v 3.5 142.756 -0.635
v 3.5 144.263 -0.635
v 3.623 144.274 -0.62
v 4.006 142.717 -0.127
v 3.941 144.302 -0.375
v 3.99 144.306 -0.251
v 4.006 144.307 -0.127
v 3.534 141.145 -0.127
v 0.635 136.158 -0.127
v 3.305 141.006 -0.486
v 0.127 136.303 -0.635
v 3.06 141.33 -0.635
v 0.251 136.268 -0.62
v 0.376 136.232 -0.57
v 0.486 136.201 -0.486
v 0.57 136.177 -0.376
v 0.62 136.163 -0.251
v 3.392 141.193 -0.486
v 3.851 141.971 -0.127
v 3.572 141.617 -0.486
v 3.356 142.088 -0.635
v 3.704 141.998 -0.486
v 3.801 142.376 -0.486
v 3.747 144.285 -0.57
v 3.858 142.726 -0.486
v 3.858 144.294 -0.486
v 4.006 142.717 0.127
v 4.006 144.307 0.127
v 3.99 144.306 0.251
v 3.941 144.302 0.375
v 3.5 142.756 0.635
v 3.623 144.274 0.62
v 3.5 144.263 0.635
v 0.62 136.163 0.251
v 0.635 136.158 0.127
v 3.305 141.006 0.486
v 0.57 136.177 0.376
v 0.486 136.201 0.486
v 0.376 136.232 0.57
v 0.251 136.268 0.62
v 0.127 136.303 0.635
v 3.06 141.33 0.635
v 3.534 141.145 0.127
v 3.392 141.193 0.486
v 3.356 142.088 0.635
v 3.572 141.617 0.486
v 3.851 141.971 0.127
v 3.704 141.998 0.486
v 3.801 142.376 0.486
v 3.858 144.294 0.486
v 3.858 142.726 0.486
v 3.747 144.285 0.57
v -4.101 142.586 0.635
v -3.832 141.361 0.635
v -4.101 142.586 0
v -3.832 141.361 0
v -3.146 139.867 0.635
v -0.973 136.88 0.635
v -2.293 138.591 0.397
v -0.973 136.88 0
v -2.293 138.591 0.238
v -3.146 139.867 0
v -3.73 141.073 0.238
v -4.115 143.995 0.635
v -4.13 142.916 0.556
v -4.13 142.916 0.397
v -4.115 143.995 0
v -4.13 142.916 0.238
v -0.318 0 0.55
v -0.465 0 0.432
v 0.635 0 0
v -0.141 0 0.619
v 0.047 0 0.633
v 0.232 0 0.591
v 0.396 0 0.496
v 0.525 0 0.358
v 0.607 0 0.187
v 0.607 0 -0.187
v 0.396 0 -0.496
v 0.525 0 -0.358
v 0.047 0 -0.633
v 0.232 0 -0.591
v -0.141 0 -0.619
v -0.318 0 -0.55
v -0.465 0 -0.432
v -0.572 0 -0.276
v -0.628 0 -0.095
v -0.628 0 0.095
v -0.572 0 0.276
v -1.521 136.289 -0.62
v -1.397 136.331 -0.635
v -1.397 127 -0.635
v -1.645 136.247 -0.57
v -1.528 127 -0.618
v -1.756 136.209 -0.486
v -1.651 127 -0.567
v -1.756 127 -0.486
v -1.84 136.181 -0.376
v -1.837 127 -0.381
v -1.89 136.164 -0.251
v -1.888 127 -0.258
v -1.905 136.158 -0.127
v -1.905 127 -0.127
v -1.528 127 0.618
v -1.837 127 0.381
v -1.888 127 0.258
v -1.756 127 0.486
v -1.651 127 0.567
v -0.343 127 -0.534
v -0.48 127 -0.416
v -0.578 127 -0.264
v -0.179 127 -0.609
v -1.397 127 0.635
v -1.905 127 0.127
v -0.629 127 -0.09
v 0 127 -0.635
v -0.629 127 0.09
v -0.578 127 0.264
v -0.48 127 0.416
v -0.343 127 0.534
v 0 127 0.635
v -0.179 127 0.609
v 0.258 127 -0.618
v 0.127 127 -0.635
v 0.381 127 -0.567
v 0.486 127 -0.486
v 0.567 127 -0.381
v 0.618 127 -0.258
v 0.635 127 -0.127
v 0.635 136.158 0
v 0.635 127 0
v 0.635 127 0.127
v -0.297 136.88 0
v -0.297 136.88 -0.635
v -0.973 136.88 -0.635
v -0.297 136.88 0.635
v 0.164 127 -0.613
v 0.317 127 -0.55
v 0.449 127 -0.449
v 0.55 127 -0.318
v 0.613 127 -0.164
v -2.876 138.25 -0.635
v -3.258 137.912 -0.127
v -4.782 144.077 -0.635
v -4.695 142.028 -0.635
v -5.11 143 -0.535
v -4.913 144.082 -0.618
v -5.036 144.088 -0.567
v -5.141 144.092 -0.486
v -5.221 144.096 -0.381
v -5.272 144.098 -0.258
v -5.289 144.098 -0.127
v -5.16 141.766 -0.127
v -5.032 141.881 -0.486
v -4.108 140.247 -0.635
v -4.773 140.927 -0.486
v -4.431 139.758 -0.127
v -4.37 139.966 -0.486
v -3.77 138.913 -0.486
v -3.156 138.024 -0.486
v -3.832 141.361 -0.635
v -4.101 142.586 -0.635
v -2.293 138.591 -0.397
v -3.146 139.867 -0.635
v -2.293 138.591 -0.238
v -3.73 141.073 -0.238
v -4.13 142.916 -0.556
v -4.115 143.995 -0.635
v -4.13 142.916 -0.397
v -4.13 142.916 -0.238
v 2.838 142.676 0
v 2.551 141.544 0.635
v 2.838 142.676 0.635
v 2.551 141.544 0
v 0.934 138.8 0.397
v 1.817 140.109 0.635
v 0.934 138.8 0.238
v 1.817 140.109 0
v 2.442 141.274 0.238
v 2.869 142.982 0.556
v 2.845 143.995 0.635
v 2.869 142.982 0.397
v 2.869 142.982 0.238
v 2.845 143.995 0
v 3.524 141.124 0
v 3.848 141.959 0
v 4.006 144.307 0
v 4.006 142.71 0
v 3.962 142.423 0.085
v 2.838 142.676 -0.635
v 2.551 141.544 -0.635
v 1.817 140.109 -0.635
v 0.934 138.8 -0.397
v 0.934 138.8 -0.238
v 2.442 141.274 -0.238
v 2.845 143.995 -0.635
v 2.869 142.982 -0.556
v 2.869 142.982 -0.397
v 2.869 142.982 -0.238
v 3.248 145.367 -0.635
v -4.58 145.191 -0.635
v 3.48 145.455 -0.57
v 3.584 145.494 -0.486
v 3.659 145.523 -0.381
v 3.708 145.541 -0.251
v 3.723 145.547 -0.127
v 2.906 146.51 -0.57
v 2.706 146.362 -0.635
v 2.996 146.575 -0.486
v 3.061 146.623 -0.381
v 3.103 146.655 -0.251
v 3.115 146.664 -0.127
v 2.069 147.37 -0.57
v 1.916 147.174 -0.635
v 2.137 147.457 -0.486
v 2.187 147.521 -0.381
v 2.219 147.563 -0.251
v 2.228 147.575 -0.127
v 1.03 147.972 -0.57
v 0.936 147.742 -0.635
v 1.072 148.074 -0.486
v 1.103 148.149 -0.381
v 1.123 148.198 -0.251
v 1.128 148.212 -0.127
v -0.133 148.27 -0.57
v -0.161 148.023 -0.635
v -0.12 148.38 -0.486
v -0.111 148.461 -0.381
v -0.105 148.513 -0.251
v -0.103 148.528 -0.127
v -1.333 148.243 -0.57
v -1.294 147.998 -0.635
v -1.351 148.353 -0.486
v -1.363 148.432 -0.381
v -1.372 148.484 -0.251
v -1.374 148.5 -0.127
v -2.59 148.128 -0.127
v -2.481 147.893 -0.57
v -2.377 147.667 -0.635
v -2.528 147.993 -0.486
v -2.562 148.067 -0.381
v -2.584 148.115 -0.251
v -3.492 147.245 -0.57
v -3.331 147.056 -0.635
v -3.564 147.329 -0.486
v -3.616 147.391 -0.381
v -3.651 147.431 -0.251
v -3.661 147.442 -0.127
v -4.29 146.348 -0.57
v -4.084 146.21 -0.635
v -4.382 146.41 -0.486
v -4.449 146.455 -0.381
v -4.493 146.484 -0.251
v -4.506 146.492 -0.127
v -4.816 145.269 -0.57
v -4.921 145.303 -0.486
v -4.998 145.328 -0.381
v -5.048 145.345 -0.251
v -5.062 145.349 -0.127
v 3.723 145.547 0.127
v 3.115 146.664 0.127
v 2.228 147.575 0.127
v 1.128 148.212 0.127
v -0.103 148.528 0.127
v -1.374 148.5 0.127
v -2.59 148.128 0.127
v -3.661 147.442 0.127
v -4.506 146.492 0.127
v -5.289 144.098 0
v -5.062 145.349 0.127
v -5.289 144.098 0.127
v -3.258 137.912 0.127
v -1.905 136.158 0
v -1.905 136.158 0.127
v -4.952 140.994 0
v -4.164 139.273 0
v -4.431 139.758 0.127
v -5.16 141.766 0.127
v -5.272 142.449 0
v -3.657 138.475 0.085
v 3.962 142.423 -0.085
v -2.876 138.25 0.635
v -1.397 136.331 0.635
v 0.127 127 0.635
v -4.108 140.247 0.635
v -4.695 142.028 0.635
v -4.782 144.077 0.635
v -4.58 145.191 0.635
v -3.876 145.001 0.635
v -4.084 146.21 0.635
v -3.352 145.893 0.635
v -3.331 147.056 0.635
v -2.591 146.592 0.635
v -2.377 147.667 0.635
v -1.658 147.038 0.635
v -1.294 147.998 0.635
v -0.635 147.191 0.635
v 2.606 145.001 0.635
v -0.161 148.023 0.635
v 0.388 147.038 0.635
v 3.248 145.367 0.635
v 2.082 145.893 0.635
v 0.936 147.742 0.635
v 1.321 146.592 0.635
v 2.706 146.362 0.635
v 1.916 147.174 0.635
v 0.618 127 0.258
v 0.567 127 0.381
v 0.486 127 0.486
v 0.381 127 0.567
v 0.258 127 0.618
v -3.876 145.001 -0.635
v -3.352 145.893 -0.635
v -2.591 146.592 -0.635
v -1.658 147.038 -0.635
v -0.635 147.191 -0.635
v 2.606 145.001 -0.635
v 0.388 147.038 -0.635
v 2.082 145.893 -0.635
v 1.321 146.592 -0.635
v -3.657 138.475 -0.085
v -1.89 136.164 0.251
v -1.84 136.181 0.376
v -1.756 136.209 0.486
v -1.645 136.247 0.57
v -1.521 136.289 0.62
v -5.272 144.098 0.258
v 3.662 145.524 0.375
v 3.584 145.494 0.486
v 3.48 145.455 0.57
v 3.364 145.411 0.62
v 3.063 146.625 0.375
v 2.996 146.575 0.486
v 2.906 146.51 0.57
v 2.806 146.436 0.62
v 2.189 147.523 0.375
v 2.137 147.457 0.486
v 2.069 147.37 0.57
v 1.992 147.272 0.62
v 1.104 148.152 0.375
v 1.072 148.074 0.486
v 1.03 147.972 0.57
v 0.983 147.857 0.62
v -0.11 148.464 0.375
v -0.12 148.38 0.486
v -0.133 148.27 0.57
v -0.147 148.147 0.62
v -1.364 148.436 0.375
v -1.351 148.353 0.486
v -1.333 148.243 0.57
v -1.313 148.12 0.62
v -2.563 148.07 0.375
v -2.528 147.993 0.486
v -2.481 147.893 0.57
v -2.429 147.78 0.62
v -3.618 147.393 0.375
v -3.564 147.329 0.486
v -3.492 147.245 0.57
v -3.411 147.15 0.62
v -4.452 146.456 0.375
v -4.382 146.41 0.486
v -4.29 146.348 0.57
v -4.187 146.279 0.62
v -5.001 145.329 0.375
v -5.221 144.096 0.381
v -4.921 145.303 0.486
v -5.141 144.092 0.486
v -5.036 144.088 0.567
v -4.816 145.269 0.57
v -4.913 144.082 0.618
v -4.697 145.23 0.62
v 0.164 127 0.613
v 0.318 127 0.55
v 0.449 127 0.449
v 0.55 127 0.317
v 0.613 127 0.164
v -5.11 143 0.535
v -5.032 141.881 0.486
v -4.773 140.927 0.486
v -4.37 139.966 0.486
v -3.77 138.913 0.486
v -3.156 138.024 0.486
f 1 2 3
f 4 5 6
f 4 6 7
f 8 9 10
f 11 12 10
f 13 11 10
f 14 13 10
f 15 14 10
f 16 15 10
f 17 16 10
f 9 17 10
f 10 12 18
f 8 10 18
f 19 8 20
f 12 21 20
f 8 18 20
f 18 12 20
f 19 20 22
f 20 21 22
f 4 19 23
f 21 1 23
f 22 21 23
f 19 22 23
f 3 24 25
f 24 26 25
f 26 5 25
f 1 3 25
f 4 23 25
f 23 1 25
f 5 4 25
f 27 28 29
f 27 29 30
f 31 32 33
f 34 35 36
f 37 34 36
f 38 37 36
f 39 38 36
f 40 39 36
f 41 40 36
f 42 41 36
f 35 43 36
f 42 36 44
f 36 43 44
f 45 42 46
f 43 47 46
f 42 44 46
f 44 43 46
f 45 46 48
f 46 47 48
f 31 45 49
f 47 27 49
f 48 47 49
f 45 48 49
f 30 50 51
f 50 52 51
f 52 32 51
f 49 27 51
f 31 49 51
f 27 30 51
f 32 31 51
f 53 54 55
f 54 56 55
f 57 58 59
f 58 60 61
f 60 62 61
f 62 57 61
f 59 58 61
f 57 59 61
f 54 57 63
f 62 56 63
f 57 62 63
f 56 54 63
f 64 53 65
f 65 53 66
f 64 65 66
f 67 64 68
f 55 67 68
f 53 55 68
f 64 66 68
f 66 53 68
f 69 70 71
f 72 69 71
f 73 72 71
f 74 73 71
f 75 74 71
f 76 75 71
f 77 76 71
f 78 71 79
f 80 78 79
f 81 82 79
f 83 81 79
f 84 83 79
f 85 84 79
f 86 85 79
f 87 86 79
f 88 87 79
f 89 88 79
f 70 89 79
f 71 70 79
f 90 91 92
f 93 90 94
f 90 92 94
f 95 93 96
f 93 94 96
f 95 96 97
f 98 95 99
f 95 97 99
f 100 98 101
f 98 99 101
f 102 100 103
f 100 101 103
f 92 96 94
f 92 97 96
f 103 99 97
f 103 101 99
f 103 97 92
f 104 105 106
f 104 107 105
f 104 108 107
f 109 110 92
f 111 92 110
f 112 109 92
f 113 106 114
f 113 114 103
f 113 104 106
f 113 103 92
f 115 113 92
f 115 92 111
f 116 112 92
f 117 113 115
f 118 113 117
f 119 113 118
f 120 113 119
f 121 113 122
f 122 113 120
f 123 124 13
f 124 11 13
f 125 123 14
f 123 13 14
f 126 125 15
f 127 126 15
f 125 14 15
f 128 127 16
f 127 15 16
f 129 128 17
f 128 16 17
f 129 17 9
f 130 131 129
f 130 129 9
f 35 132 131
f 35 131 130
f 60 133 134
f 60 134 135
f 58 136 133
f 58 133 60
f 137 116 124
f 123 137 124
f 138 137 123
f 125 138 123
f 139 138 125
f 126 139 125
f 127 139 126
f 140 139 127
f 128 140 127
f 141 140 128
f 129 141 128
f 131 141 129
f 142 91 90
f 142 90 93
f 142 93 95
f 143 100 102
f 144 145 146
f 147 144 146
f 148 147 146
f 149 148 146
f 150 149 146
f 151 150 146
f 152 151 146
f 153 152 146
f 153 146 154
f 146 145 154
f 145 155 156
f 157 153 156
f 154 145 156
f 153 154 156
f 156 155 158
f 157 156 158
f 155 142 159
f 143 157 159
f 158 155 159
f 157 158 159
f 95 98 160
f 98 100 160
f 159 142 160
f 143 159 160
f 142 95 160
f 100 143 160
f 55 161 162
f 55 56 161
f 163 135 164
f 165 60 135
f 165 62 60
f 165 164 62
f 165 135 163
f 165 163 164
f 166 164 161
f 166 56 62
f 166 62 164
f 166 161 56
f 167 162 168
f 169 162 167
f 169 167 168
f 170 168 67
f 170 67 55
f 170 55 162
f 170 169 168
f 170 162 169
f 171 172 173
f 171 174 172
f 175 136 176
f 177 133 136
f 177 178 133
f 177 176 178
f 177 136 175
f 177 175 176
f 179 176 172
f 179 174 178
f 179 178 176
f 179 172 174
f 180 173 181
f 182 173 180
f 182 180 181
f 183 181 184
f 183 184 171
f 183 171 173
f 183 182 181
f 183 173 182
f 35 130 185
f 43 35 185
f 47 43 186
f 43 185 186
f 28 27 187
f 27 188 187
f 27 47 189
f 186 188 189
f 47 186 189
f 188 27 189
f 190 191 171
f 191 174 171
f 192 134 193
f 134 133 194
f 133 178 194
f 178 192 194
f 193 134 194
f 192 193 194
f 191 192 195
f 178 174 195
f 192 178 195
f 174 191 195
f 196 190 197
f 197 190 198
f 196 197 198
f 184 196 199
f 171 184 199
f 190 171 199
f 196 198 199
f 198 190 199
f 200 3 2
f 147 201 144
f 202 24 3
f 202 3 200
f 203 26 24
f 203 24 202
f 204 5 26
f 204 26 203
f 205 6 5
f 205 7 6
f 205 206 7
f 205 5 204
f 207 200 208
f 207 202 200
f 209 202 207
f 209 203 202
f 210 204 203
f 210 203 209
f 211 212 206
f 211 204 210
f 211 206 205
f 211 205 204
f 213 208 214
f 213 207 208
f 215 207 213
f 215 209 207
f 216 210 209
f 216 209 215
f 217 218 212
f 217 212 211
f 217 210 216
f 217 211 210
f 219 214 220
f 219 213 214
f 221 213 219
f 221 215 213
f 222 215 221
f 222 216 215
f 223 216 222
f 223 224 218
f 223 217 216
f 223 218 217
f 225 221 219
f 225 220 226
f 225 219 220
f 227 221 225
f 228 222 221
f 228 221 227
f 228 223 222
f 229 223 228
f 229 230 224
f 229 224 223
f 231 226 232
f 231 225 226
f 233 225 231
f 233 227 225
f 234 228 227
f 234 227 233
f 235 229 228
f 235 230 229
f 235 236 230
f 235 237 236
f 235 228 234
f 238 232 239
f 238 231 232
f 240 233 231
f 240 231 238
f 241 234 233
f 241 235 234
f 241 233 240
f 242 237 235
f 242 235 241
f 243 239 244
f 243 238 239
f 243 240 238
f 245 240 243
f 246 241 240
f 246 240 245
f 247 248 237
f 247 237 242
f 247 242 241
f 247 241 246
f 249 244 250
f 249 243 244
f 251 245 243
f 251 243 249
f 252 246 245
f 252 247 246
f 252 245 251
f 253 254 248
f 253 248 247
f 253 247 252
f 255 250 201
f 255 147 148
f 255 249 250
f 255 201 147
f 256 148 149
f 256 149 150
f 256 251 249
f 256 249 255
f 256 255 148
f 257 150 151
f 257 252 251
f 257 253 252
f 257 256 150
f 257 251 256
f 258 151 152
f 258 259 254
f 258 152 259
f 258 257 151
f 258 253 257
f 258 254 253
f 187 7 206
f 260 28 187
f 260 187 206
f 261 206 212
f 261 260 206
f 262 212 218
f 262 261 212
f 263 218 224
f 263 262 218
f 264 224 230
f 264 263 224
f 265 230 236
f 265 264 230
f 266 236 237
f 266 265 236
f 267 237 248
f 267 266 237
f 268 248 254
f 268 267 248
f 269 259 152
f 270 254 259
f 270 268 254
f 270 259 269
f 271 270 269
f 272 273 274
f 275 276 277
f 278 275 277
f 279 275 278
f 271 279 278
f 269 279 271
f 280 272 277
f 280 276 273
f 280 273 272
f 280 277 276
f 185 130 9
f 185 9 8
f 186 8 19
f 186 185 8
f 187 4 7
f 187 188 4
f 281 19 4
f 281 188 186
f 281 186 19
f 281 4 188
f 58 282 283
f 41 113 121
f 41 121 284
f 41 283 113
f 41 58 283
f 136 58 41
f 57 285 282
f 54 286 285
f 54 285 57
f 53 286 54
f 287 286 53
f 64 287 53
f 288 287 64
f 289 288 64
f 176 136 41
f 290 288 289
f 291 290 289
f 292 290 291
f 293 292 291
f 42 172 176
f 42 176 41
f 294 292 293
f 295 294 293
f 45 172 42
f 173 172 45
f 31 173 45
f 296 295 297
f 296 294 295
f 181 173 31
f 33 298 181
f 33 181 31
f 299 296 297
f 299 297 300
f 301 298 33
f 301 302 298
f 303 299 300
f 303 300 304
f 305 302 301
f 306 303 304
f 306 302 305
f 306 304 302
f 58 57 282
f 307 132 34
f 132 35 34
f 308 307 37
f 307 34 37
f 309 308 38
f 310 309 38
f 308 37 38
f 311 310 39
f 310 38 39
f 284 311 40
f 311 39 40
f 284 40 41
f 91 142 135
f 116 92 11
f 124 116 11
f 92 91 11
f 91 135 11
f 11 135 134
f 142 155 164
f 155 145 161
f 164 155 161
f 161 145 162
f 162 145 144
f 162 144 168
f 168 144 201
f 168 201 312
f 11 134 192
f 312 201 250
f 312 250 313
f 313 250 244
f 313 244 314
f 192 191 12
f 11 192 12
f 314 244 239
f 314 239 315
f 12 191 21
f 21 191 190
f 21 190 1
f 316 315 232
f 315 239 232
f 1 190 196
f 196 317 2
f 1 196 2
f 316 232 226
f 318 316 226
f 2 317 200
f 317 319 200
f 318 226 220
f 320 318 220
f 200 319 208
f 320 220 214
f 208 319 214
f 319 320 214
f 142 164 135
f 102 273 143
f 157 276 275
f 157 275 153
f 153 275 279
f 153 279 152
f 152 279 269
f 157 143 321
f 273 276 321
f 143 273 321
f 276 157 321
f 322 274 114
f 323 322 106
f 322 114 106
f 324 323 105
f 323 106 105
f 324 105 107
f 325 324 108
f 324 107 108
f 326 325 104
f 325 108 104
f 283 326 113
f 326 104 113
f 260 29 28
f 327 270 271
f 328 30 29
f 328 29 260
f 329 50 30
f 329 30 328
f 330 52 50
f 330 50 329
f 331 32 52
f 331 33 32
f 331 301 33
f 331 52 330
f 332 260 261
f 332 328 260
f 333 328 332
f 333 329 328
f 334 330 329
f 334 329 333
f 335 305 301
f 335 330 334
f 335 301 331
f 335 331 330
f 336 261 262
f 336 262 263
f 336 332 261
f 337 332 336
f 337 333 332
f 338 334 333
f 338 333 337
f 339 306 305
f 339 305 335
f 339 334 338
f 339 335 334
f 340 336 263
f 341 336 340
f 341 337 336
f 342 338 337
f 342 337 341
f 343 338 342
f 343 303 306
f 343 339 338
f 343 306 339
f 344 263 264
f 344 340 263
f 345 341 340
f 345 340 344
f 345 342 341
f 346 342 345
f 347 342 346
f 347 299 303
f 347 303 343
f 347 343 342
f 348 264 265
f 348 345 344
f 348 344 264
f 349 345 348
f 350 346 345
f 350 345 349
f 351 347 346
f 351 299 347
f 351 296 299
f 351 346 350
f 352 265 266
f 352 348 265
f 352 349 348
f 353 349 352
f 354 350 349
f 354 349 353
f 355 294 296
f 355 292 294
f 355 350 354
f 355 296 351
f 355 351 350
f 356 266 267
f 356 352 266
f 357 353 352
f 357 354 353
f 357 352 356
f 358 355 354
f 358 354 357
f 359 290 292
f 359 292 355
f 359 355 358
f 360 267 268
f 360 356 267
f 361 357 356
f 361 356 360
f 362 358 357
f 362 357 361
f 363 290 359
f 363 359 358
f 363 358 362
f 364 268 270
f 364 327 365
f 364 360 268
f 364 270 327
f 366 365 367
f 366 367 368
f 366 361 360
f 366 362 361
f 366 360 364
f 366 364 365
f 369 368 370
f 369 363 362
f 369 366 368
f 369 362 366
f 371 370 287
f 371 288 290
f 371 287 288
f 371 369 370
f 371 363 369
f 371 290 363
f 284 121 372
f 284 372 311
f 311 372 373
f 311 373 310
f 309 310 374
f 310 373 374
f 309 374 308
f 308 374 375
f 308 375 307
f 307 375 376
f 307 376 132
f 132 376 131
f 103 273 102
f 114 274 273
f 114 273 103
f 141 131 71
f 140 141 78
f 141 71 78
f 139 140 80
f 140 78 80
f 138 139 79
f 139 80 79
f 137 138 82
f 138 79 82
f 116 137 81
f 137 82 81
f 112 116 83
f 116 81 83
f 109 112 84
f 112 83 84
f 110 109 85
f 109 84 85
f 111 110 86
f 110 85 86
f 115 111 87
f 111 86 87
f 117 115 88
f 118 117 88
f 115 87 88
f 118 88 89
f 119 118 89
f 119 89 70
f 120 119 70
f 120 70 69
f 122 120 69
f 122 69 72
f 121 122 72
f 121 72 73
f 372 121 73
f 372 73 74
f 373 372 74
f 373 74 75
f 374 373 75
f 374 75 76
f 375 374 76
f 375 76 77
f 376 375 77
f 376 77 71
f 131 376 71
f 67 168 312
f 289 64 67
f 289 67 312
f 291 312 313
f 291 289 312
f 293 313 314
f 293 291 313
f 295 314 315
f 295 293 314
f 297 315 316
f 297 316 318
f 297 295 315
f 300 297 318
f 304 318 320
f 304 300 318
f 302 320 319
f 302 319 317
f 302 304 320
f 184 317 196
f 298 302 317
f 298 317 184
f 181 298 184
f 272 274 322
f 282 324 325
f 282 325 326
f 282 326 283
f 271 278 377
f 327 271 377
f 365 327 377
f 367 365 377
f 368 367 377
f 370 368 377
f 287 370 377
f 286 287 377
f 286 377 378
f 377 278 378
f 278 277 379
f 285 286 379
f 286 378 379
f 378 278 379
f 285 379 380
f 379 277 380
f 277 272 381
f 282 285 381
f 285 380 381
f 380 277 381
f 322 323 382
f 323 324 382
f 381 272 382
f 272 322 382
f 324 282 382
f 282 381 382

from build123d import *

# Parameters (mm, degrees)
SKETCH1_R                = 0.635
BOSS_EXTRUDE1_DEPTH      = 127
BOSS_EXTRUDE2_DEPTH      = 0.635
BOSS_EXTRUDE2_DEPTH_BACK = 0.635
FILLET1_R                = 0.508


with BuildPart() as part:
    # Sketch1 → Boss-Extrude1 (new body)
    with BuildSketch(Plane(origin=(0, 0, 0), x_dir=(1, 0, 0), z_dir=(0, 1, 0))):
        Circle(SKETCH1_R)
    extrude(amount=BOSS_EXTRUDE1_DEPTH)

    # Sketch2 → Boss-Extrude2 (add, two sides)
    with BuildSketch(Plane.XY) as boss_extrude2_sk:
        with BuildLine():
            Line((-1.905, 127), (0.635, 127))
            Line((0.635, 127), (0.635, 136.158420865))
            add(Edge.make_bspline(
                [(0.635, 136.158420865), (4.153630903, 141.818791199), (4.114669439, 141.992054971), (4.005734255, 144.307253859)],
                knots=[0, 0, 0, 0, 1, 1, 1, 1], degree=3))
            ThreePointArc((4.005734255, 144.307253859), (-0.739604915, 148.557439765), (-5.289336973, 144.098486718))
            add(Edge.make_bspline(
                [(-1.905, 136.158420865), (-3.718327637, 138.500370735), (-5.598593588, 140.574024695), (-5.289336973, 144.098486718)],
                knots=[0, 0, 0, 0, 1, 1, 1, 1], degree=3))
            Line((-1.905, 136.158420865), (-1.905, 127))
        make_face()
        with BuildLine():
            add(Edge.make_bspline(
                [(-0.297199842, 136.880205631), (-0.107641201, 137.223242161), (0.313462848, 137.90543324), (1.149179042, 139.110045469), (1.915323622, 140.205619235), (2.462394721, 141.272158502), (2.748069771, 142.085078064), (2.871045761, 142.816900596), (2.888508164, 143.458131128), (2.864325917, 143.820492805), (2.844879762, 143.995433072)],
                knots=[0, 0, 0, 0, 0.125, 0.25, 0.5, 0.625, 0.75, 0.875, 0.9375, 1, 1, 1, 1], degree=3))
            Line((-0.297199842, 136.880205631), (-0.972800158, 136.880205631))
            add(Edge.make_bspline(
                [(-0.972800158, 136.880205631), (-1.198644094, 137.171887712), (-1.663408729, 137.76102171), (-2.517671044, 138.87030936), (-3.240026875, 139.952731811), (-3.749328451, 141.06606592), (-4.016349262, 141.942088489), (-4.13205868, 142.739298518), (-4.150496215, 143.42980398), (-4.131124798, 143.810295526), (-4.114879762, 143.995433072)],
                knots=[0, 0, 0, 0, 0.125, 0.25, 0.5, 0.625, 0.75, 0.875, 0.9375, 1, 1, 1, 1], degree=3))
            ThreePointArc((-4.114879762, 143.995433072), (-0.635, 147.191296776), (2.844879762, 143.995433072))
        make_face(mode=Mode.SUBTRACT)
    extrude(amount=BOSS_EXTRUDE2_DEPTH)
    extrude(boss_extrude2_sk.sketch, amount=-BOSS_EXTRUDE2_DEPTH_BACK)

    # Fillet1
    fillet1_edges = [part.edges().sort_by_distance(p)[0] for p in [
        (-0.739604915, 148.557439765, -0.635),
        (0.635, 131.579210433, 0.635),
        (-0.739604915, 148.557439765, 0.635),
        (-1.905, 131.579210433, -0.635),
        (-1.905, 131.579210433, 0.635),
        (0.635, 131.579210433, -0.635),
    ]]
    fillet(fillet1_edges, radius=FILLET1_R)


solid = part.part
